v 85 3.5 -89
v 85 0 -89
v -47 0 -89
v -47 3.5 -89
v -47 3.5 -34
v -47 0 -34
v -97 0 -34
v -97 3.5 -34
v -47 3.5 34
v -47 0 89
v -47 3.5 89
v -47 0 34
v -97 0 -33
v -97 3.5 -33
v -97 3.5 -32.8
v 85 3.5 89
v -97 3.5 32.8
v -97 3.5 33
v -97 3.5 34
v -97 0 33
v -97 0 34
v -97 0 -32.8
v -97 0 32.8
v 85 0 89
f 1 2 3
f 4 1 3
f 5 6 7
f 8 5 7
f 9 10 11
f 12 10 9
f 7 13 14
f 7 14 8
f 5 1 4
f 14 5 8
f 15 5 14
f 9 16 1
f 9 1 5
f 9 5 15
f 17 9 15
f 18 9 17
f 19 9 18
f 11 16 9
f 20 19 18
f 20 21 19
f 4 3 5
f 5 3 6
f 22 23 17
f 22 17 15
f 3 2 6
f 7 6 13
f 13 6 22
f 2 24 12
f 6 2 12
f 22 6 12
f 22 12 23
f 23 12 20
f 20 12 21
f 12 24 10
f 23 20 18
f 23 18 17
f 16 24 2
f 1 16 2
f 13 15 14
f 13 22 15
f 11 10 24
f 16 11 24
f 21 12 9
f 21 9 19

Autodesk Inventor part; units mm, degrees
ref_plane "YZ Plane" through (0, 0, 0) normal (1, 0, 0) x (0, 1, 0)
ref_plane "XZ Plane" through (0, 0, 0) normal (0, 1, 0) x (-1, 0, 0)
ref_plane "XY Plane" through (0, 0, 0) normal (0, 0, 1) x (1, 0, 0)
sketch "Sketch1" plane through (0, 0, 0) normal (0, 1, 0) x (-1, 0, 0)
  line L0 (99, 89) -> (-99, 89)
  line L1 (-99, 89) -> (-99, -89)
  line L2 (-99, -89) -> (99, -89)
  line L3 (99, -89) -> (99, 89)
  line L4 (99, 89) -> (-99, -89) construction
  line L5 (-99, 89) -> (99, -89) construction
  line L6 (-99, 89) -> (-85, 89)
  line L7 (-85, 89) -> (-85, -89)
  line L8 (-85, -89) -> (-99, -89)
  line L9 (-99, -89) -> (-99, 89)
  line L10 (99, 89) -> (97, 89)
  line L11 (97, 89) -> (97, -89)
  line L12 (97, -89) -> (99, -89)
  line L13 (99, -89) -> (99, 89)
  line L14 (97, 33) -> (97, 35)
  line L15 (97, -33) -> (97, -35)
  line L16 (97, 32.8) -> (97, 35)
  line L17 (97, -32.8) -> (97, -35)
  line L18 (97, 89) -> (47, 89)
  line L19 (47, 89) -> (47, 34)
  line L20 (47, 34) -> (97, 34)
  line L21 (97, 34) -> (97, 89)
  line L22 (97, -89) -> (47, -89)
  line L23 (47, -89) -> (47, -34)
  line L24 (47, -34) -> (97, -34)
  line L25 (97, -34) -> (97, -89)
  line L26 (66.5, 33) -> (77.5, 33) projected
  line L27 (77.5, -33) -> (66.5, -33) projected
  point P0 (0, 0)
  point P1 (47, 89)
  point P2 (47, -89)
  point P3 (97, 34)
  dimension "d0" = 198
  dimension "d1" = 178
  dimension "d2" = 14
  dimension "d3" = 2
  dimension "d16" = 50
  dimension "d17" = 55
  dimension "d18" = 50
  dimension "d19" = 55
  dimension "d20" = 1
  dimension "d21" = 1
extrude "Extrusion1" add sketch "Sketch1" along normal blind 3.5 contours L19 L20 L11 L24 L23 L2 L7 L0
properties part number "base" material "Nylon 6/6"
